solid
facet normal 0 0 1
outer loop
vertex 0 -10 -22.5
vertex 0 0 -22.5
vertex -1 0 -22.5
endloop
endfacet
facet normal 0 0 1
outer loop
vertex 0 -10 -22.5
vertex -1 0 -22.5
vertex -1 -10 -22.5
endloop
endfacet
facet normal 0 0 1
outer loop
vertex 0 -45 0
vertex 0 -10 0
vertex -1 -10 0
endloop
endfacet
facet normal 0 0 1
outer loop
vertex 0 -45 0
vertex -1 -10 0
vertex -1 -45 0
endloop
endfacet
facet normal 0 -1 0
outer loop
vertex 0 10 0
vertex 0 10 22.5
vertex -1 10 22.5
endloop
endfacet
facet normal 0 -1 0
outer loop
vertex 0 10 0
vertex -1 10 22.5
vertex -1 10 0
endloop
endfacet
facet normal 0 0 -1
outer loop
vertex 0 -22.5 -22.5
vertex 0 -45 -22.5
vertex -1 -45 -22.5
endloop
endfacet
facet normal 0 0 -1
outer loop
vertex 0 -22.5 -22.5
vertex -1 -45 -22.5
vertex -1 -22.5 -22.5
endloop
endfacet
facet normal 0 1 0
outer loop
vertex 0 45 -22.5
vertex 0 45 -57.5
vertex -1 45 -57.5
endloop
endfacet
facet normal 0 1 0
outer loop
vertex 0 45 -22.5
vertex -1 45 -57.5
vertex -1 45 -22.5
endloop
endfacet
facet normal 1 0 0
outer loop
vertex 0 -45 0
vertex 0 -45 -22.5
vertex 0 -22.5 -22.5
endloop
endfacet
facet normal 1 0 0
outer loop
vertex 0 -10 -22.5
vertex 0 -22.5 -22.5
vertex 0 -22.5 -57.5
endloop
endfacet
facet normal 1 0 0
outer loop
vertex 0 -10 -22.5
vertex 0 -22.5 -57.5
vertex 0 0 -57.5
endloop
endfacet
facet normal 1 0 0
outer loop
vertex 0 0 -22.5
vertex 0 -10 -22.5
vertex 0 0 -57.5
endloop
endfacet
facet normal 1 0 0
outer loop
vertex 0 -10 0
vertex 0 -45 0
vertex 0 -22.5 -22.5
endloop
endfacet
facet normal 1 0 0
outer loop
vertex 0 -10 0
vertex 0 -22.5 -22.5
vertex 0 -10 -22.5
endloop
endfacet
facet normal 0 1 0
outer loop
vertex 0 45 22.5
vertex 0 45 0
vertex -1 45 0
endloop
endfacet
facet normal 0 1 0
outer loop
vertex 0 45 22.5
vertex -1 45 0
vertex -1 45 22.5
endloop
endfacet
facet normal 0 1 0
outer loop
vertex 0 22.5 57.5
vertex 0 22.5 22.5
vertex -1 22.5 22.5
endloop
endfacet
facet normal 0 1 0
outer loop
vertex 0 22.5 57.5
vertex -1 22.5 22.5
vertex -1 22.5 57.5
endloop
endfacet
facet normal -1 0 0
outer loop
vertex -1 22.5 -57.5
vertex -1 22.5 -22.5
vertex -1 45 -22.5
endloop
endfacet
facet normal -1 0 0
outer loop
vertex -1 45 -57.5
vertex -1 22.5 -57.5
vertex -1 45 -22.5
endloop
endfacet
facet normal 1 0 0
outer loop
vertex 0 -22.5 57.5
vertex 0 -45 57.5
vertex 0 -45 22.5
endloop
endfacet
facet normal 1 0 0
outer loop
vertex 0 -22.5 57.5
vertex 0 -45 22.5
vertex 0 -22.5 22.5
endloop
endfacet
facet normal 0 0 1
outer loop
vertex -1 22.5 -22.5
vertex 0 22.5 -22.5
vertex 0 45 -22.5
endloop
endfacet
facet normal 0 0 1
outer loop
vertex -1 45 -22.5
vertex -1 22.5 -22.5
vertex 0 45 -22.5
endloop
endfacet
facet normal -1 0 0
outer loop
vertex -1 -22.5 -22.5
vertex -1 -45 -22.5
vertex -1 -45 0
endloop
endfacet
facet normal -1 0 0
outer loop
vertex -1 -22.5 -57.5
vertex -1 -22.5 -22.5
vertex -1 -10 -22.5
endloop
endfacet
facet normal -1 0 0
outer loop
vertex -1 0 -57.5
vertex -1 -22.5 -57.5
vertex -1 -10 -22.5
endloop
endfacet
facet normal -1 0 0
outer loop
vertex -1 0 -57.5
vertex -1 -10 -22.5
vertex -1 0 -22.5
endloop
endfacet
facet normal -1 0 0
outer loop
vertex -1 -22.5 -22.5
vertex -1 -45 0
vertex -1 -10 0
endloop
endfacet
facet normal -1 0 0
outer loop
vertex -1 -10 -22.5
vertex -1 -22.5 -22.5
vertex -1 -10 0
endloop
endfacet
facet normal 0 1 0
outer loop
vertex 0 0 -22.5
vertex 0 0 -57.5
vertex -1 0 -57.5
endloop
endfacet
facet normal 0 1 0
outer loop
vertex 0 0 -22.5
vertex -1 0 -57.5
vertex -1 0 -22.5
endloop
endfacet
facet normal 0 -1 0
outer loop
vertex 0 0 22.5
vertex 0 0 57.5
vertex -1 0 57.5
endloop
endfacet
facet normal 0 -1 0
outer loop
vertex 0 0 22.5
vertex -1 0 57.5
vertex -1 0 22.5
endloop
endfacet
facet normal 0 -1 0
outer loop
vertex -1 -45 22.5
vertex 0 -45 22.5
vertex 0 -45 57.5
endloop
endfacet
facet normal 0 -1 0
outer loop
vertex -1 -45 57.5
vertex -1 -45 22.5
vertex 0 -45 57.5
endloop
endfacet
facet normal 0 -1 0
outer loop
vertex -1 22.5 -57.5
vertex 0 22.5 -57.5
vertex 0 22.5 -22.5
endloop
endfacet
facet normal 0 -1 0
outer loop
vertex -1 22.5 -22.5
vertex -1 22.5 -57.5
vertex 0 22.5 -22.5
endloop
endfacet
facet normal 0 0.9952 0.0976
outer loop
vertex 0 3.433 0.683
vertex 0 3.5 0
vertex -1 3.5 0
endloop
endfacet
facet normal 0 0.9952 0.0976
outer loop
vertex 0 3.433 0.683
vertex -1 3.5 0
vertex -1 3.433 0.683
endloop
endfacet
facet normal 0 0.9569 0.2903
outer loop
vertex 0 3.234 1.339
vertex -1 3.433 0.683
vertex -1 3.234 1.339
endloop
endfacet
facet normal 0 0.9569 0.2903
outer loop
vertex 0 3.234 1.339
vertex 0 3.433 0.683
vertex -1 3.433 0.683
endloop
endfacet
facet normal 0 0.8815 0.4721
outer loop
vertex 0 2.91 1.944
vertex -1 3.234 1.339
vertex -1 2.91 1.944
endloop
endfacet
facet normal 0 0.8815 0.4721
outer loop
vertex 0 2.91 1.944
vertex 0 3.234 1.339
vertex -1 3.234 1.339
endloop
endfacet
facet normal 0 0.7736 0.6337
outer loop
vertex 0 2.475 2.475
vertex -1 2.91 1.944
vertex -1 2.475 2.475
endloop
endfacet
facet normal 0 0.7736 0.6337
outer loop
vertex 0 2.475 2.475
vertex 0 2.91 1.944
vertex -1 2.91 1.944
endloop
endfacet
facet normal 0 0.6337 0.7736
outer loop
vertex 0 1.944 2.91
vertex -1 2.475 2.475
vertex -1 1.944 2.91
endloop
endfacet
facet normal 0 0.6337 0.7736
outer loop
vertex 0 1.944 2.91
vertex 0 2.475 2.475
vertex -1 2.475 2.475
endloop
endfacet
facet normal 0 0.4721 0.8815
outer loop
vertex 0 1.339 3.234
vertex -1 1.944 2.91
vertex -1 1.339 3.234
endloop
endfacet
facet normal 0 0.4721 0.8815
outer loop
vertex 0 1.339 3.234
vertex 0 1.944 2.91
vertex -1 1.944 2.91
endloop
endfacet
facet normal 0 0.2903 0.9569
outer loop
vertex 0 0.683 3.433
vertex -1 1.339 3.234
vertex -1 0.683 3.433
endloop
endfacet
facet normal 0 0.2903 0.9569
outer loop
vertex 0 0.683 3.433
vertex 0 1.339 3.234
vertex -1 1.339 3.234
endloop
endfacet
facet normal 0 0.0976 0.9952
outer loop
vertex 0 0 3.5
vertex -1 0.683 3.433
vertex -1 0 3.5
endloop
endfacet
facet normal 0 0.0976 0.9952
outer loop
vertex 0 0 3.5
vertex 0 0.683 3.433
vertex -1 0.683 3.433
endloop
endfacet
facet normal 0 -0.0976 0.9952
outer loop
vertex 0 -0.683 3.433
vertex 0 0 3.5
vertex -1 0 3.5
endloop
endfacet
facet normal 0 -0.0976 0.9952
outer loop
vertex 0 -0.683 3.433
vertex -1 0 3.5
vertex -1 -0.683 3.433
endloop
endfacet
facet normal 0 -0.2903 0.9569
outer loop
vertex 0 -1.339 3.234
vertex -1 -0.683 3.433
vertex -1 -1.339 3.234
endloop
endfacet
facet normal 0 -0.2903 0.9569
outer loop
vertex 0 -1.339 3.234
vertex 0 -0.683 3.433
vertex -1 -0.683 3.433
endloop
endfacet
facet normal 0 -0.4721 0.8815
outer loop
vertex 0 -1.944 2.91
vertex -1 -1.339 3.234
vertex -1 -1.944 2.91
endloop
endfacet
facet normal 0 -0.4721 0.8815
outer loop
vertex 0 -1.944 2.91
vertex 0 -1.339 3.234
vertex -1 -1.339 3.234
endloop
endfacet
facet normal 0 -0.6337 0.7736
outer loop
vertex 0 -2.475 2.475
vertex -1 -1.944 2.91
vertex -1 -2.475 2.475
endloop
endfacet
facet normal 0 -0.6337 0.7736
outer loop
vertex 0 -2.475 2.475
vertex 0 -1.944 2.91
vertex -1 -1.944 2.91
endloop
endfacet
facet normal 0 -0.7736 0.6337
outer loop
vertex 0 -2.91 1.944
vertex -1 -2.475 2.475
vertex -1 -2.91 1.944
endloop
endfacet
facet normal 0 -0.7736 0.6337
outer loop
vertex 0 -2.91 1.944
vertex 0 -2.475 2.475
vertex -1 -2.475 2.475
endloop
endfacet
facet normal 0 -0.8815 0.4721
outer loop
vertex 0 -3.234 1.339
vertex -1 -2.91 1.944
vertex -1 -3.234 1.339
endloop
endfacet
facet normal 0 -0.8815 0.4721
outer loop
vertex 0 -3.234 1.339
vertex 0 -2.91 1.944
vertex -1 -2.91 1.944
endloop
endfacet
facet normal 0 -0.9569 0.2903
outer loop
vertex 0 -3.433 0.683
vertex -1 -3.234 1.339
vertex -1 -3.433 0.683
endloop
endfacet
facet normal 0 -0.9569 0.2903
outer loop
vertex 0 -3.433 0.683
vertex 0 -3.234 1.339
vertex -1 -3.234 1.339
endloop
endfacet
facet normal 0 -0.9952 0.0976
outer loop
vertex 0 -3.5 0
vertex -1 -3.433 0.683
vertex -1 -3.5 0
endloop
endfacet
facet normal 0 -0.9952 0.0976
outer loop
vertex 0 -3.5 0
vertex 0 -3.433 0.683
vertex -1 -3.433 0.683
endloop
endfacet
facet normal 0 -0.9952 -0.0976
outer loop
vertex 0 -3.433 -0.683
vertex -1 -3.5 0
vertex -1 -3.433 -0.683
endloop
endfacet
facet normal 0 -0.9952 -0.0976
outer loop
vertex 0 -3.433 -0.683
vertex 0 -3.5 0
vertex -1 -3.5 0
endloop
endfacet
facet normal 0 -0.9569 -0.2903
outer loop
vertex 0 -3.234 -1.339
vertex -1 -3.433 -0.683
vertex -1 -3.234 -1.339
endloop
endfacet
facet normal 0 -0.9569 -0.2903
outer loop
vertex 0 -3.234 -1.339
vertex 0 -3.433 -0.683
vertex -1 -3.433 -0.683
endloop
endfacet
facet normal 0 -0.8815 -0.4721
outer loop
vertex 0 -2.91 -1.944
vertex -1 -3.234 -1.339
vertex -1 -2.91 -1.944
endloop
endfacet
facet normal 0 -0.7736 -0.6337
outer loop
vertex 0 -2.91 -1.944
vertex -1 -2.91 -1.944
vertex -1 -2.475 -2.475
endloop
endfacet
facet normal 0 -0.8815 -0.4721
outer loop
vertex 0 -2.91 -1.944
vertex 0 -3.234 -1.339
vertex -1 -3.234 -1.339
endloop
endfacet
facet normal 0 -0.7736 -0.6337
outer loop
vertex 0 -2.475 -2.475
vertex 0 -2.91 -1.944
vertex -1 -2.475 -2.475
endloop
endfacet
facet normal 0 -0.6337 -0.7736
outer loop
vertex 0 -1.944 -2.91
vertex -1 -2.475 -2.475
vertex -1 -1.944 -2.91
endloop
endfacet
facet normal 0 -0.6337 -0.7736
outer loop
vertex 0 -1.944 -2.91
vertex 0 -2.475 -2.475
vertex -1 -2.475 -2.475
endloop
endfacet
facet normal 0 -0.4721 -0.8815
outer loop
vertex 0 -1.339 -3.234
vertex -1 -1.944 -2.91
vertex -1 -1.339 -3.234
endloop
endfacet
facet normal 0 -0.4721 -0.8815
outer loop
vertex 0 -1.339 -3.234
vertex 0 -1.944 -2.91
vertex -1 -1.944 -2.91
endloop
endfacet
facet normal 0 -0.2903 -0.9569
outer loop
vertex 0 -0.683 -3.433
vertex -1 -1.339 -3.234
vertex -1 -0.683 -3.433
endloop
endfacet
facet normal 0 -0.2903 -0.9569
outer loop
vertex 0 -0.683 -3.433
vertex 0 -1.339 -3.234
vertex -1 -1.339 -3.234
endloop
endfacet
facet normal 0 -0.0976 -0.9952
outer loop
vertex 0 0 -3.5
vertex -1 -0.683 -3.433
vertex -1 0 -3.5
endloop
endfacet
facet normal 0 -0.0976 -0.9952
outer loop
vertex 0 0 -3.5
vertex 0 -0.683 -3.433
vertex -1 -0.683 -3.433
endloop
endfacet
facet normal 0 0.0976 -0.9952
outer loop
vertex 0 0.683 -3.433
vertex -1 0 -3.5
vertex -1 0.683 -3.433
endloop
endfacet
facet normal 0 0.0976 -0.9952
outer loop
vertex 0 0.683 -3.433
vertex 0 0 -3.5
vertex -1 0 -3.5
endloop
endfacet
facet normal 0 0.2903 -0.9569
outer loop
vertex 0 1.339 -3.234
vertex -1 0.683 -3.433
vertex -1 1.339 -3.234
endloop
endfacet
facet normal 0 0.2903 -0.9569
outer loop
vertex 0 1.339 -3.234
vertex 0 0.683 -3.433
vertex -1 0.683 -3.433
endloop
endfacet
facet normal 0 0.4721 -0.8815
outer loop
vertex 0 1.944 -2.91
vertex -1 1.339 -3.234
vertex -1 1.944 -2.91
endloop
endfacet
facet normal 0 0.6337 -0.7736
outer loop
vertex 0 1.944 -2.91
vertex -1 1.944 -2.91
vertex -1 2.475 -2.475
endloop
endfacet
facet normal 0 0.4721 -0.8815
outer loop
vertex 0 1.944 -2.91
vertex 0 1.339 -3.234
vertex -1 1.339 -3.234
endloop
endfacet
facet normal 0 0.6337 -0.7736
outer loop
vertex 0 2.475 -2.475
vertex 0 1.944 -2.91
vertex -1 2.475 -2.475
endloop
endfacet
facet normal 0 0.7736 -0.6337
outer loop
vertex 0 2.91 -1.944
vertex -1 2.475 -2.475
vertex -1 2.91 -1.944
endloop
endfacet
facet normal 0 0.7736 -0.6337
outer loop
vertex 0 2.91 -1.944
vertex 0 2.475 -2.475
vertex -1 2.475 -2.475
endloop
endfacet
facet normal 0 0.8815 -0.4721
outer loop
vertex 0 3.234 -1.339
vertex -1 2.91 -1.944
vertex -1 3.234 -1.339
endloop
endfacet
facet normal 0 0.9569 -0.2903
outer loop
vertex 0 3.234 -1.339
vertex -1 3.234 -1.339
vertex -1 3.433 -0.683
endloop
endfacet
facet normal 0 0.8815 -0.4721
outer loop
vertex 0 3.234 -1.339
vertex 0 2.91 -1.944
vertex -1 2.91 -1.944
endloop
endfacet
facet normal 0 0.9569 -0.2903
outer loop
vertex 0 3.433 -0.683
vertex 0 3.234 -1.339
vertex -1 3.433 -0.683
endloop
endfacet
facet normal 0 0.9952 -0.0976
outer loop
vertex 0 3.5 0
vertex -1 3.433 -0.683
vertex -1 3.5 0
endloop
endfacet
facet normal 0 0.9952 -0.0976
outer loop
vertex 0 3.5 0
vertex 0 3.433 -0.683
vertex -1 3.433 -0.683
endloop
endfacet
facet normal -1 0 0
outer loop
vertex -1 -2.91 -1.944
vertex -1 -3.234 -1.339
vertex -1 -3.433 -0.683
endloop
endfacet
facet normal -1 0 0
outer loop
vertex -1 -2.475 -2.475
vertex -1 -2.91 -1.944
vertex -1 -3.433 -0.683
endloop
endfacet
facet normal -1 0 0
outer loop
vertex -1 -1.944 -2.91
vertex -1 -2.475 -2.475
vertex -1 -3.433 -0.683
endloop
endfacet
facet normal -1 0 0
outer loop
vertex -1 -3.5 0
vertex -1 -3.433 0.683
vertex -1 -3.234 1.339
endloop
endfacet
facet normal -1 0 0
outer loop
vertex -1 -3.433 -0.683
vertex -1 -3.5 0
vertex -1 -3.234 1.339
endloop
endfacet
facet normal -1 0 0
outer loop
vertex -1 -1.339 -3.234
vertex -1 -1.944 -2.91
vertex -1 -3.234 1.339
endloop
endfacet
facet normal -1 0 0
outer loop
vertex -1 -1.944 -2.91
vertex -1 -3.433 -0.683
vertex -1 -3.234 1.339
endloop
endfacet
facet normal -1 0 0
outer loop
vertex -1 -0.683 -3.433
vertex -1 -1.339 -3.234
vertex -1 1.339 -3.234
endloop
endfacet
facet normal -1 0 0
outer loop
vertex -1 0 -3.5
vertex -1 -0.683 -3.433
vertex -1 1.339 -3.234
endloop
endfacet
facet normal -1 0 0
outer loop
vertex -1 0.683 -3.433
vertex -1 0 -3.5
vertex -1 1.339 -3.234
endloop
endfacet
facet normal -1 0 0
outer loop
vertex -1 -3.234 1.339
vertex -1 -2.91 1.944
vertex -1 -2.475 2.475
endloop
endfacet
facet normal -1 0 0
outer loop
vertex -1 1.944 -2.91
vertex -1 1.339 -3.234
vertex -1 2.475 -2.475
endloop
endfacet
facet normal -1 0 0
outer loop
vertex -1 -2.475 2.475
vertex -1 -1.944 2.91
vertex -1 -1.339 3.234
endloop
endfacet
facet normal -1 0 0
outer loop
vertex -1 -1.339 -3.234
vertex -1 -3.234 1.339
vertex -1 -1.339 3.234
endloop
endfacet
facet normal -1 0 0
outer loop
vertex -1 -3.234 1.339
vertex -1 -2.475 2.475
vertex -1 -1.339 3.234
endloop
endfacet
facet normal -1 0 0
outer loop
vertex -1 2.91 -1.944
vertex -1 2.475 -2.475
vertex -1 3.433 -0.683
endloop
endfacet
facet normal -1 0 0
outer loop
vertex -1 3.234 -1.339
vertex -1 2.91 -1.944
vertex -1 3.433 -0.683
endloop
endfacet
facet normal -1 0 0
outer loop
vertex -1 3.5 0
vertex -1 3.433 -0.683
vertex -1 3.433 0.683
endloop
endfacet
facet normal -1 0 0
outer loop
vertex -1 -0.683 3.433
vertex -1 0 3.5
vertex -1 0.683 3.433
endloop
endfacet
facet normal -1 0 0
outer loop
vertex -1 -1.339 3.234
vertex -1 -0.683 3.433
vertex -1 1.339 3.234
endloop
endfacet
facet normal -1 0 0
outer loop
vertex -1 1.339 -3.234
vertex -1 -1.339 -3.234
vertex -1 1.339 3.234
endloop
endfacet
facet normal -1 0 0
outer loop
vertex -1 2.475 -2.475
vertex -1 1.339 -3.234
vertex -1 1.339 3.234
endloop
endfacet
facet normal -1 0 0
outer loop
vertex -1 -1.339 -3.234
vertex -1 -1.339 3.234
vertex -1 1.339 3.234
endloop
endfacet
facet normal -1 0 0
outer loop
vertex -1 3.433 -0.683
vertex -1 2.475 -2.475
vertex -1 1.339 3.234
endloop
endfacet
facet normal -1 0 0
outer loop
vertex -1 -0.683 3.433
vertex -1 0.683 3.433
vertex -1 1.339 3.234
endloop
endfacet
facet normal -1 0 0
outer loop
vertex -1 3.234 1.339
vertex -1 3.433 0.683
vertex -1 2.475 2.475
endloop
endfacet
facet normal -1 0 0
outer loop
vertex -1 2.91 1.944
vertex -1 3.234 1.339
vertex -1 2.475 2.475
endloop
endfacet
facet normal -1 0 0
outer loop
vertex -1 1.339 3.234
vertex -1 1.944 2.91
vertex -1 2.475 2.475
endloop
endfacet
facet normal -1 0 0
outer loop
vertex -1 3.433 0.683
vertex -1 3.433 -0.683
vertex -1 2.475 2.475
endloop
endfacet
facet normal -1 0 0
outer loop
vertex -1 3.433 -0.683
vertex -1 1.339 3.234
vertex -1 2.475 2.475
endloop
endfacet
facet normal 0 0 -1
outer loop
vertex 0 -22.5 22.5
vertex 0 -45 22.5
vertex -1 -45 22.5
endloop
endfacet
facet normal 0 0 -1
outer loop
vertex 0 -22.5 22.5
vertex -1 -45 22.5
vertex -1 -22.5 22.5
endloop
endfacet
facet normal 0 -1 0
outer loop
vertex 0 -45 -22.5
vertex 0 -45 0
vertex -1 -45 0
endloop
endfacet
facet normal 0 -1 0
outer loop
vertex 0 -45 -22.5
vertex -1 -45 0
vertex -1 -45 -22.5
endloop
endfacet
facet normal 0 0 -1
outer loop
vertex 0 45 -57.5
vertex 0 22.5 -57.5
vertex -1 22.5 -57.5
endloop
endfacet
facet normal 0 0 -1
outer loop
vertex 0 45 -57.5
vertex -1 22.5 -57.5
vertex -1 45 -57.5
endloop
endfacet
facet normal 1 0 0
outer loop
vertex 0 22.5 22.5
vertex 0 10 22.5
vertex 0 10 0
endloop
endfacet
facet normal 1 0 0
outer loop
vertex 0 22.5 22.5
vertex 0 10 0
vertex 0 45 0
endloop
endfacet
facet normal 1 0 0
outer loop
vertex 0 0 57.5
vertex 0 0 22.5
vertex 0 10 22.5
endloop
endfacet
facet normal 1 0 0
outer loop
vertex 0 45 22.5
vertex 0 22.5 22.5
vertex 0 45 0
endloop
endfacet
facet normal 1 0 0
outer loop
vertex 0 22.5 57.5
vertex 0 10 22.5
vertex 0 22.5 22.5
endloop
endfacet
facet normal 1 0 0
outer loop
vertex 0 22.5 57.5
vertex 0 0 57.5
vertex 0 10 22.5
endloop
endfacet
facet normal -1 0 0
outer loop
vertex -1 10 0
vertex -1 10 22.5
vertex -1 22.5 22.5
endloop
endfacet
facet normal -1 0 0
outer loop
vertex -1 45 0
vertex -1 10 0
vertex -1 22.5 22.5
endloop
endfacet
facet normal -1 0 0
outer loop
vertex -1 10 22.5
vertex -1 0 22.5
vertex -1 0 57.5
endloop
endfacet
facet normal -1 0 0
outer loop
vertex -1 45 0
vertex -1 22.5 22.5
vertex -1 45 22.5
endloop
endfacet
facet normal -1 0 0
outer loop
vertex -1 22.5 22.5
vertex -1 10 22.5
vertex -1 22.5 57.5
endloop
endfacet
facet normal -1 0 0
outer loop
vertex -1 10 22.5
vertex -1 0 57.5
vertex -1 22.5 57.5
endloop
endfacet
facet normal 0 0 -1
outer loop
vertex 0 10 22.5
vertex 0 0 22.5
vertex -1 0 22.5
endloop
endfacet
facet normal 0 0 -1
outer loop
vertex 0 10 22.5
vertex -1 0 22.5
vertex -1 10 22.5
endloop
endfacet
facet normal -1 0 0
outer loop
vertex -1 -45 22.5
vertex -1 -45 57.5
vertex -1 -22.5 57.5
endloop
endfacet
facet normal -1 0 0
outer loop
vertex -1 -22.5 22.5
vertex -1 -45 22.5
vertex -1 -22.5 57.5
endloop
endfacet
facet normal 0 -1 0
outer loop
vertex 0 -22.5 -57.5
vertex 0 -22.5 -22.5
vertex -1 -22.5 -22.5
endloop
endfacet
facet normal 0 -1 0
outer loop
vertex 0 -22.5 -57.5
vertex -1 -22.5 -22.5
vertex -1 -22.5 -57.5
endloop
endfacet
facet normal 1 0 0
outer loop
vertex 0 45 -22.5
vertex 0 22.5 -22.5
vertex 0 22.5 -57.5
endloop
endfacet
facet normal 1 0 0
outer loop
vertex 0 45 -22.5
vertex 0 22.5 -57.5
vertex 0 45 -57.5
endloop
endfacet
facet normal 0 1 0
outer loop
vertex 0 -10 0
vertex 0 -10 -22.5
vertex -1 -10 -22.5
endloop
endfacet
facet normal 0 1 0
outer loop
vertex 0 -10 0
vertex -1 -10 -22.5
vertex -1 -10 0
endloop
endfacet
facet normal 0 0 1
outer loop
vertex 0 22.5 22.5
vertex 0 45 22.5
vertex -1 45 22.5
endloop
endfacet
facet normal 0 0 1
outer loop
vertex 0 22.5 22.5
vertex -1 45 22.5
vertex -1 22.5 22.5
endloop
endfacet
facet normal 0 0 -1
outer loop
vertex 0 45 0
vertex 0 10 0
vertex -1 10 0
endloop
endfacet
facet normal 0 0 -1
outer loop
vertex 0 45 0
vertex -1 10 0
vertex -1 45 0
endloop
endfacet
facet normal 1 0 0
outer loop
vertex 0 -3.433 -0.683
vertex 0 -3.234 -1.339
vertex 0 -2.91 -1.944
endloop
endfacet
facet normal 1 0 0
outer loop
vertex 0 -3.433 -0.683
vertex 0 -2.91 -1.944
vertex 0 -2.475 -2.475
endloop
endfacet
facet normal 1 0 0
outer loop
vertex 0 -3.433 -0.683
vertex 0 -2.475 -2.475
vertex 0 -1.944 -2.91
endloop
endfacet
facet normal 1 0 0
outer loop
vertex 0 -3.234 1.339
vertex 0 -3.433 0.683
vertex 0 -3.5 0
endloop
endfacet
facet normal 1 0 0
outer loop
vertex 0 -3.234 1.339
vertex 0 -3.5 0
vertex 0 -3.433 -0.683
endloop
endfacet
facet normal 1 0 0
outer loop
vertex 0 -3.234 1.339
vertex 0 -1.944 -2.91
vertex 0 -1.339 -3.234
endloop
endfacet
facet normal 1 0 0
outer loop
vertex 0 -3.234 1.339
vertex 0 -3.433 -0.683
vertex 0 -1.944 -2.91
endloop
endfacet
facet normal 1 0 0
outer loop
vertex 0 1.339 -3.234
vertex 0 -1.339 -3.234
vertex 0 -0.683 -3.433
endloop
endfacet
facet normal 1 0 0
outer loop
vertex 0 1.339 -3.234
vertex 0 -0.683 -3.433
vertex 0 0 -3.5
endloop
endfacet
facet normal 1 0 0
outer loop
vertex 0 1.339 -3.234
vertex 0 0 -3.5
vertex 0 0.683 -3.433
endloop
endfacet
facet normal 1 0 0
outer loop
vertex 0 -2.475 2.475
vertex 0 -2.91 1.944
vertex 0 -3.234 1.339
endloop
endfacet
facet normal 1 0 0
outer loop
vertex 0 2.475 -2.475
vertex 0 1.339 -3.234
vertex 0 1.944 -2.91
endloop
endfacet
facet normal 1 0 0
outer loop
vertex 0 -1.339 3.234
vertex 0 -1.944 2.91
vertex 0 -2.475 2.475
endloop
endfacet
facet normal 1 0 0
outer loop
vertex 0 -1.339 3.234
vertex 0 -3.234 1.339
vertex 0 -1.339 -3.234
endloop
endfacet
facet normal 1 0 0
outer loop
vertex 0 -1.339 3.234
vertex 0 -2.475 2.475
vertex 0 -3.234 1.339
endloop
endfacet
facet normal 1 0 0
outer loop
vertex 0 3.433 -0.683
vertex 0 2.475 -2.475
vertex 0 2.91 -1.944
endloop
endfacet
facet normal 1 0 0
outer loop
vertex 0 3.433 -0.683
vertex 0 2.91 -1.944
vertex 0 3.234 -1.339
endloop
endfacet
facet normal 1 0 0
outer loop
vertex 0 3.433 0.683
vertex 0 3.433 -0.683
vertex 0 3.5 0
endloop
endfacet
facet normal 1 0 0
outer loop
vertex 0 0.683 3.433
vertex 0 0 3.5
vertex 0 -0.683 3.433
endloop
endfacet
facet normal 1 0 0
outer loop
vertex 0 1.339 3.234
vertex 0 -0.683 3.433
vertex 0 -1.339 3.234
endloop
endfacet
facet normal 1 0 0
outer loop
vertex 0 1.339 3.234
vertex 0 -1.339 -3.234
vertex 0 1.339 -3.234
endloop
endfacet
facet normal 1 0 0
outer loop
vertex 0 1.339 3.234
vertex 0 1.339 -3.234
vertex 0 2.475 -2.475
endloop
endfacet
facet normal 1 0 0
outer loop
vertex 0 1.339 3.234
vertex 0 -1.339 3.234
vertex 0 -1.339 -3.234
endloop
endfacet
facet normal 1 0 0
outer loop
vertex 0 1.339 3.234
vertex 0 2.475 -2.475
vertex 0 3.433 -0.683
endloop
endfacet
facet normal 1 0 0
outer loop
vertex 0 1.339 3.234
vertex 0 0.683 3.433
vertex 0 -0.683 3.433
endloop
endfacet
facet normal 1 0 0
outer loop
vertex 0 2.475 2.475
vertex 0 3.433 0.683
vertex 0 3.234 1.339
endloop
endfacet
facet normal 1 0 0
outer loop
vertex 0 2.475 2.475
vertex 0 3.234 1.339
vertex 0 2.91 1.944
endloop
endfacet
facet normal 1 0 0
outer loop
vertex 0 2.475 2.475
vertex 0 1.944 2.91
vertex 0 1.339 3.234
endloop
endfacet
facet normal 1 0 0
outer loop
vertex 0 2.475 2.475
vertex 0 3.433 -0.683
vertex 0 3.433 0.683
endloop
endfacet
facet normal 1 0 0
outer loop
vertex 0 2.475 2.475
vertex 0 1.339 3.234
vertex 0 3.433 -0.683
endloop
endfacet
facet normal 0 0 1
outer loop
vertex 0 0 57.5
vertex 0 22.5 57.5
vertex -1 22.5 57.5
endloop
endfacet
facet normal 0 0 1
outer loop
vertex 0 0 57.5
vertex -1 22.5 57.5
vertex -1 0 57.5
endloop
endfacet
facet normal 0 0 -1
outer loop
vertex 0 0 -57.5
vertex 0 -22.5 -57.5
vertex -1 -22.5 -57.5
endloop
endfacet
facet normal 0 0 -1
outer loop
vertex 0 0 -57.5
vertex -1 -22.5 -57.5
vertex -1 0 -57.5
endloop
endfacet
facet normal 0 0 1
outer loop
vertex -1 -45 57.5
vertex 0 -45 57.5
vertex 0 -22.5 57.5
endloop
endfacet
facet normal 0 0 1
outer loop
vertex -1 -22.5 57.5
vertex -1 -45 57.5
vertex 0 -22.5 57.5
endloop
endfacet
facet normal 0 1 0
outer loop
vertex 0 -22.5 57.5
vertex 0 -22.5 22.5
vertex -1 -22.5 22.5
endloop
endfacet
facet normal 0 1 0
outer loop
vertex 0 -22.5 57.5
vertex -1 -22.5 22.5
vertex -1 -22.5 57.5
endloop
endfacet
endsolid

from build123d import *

# Parameters (mm, degrees)
F0_W     = 22.5
F0_H     = 35
F0_R     = 3.5
F1_DEPTH = 1


with BuildPart() as f1:
    # F0 (on Right) → F1 (new body)
    with BuildSketch(Plane.YZ):
        with Locations((-33.75, 40)):
            Rectangle(F0_W, F0_H)
        Polygon((-10, 0), (-45, 0), (-45, -22.5), (-22.5, -22.5), (-10, -22.5), align=None)
        Polygon((-10, -22.5), (-22.5, -22.5), (-22.5, -57.5), (0, -57.5), (0, -22.5), align=None)
        with Locations((33.75, -40)):
            Rectangle(F0_W, F0_H)
        Circle(F0_R)
        Polygon((45, 22.5), (22.5, 22.5), (10, 22.5), (10, 0), (45, 0), align=None)
        Polygon((22.5, 57.5), (0, 57.5), (0, 22.5), (10, 22.5), (22.5, 22.5), align=None)
    extrude(amount=-F1_DEPTH)


solid = f1.part
